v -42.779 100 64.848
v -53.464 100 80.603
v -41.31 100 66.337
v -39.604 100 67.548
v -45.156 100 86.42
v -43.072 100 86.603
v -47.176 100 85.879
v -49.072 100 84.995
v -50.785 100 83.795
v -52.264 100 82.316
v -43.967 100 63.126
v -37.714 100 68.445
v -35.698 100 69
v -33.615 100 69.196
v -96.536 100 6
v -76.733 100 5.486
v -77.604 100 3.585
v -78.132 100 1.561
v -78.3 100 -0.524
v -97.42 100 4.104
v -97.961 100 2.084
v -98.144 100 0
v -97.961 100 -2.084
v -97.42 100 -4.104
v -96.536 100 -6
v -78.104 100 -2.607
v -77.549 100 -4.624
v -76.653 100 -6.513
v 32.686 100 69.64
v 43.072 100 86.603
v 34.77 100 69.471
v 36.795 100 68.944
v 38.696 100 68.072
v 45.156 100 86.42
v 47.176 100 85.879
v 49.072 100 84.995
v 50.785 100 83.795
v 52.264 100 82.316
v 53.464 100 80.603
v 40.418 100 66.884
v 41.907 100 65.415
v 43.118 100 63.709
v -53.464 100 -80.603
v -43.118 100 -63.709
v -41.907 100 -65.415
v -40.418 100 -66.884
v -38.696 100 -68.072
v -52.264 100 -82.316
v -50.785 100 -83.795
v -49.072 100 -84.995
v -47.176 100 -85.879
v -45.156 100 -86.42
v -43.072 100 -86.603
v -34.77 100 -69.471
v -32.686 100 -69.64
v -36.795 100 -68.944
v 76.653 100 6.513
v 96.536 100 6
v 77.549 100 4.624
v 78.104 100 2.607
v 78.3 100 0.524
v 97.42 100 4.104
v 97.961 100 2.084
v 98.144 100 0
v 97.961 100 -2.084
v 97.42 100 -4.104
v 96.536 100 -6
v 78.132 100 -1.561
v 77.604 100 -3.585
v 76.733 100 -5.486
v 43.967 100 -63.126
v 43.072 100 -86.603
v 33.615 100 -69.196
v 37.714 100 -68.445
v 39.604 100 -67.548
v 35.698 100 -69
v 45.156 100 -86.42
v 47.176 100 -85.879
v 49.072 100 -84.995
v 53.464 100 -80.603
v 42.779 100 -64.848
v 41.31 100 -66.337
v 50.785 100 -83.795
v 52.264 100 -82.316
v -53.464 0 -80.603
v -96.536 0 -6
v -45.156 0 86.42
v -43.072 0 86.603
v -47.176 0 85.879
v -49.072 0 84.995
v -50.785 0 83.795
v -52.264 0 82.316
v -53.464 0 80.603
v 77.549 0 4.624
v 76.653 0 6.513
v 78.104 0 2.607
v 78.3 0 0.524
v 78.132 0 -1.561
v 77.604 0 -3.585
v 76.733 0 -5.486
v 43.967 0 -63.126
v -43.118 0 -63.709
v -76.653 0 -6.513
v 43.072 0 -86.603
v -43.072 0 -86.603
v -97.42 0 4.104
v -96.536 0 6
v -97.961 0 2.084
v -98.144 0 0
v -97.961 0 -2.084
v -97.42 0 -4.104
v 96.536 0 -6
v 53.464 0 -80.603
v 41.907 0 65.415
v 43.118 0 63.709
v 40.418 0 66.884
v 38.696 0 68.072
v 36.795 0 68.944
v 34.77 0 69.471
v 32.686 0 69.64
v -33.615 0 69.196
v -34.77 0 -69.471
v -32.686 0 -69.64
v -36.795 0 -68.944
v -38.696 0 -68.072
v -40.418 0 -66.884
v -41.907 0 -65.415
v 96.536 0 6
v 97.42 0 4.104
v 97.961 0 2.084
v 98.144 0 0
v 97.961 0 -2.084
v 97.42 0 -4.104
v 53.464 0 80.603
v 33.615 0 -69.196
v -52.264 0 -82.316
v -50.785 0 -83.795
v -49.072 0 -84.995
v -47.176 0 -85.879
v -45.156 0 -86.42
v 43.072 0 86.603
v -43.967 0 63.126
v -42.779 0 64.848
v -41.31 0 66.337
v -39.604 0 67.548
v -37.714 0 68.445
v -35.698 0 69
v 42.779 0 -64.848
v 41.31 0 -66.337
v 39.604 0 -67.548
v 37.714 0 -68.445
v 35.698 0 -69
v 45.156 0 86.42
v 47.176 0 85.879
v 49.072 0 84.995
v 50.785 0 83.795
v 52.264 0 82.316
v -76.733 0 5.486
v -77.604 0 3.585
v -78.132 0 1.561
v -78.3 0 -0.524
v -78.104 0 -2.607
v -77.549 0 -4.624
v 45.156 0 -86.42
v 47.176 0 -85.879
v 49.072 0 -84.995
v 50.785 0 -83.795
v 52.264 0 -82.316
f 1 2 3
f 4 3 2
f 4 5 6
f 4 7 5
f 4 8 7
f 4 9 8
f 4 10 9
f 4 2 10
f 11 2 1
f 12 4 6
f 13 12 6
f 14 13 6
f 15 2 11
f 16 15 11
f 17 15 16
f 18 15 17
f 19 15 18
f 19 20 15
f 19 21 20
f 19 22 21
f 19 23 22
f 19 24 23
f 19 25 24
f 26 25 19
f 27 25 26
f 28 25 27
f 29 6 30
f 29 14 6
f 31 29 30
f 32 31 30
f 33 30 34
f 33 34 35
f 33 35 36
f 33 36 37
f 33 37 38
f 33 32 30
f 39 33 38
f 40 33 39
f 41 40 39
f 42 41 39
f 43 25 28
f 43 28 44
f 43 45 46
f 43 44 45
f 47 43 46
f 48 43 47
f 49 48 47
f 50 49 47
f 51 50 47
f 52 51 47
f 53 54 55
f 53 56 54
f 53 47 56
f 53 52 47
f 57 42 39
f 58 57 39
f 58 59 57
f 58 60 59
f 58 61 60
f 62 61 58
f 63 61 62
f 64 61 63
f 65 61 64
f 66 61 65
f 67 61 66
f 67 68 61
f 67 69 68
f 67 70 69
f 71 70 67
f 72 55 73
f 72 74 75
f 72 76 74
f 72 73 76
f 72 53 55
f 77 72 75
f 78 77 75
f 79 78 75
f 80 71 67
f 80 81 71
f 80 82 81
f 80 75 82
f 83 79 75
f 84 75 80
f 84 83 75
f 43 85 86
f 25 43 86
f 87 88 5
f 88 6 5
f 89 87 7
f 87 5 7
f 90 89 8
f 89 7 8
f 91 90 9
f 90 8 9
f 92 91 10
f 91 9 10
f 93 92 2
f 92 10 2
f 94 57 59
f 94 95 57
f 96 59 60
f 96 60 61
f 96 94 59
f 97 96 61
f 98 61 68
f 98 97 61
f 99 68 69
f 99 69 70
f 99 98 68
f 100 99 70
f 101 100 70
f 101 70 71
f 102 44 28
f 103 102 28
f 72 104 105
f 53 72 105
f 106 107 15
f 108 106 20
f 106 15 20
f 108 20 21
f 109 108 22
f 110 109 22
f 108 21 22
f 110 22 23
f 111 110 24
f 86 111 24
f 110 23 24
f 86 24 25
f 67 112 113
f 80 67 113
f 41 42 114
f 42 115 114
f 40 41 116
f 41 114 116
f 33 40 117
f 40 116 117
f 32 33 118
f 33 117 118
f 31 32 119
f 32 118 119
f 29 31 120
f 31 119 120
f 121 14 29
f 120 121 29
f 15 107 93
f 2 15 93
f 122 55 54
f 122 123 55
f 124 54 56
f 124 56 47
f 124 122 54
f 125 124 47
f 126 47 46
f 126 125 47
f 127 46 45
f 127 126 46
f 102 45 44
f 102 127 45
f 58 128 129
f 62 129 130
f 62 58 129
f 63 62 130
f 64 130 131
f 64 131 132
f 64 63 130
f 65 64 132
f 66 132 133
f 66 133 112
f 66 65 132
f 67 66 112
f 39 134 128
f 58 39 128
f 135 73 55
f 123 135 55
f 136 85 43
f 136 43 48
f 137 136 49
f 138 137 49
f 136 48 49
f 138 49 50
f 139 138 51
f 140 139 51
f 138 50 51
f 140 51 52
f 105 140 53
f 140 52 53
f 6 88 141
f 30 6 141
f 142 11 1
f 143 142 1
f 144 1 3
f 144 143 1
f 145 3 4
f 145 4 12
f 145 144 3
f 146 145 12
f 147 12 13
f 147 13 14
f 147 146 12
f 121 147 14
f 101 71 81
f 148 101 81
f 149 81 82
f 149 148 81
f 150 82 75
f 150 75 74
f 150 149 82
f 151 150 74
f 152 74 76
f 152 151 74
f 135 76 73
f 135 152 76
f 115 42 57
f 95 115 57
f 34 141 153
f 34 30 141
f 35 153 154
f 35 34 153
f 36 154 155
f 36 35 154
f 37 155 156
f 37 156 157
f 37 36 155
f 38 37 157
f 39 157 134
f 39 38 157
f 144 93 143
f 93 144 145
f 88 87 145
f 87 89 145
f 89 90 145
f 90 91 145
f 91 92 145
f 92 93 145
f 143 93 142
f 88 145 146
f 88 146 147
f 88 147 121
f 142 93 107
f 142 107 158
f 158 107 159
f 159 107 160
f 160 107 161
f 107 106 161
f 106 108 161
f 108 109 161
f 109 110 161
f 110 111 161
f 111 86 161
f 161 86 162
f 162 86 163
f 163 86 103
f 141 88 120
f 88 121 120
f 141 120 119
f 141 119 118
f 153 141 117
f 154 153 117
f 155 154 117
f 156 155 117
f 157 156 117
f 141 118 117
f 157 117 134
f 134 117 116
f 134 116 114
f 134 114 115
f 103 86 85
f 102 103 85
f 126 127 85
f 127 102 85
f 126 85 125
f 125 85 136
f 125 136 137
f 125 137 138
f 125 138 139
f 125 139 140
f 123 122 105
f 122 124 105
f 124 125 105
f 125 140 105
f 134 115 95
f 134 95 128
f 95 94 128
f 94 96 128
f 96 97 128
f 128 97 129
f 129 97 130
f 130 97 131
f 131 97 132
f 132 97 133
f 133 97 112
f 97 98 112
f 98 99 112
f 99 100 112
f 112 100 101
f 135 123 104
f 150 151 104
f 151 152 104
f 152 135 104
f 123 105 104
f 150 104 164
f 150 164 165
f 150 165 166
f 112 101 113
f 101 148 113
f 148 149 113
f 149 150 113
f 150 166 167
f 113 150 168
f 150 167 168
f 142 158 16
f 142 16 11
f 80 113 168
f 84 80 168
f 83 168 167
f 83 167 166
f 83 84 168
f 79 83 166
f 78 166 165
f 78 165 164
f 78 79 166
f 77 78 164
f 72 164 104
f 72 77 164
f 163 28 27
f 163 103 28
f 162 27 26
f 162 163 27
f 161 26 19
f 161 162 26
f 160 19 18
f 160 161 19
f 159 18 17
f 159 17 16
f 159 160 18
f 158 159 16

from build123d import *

# Parameters (mm, degrees)
SALIENTE_EXTRUIR2_DEPTH = 100
CORTAR_EXTRUIR1_DEPTH   = 100
REDONDEO1_R             = 12
REDONDEO2_R             = 12


with BuildPart() as part:
    # Croquis1 → Saliente-Extruir2 (new body)
    with BuildSketch(Plane(origin=(0, 0, 0), x_dir=(1, 0, 0), z_dir=(0, 1, 0))):
        Polygon((-50, -86.602540378), (50, -86.602540378), (100, 0), (50, 86.602540378), (-50, 86.602540378), (-100, 0), align=None)
    extrude(amount=SALIENTE_EXTRUIR2_DEPTH)

    # Croquis3 → Cortar-Extruir1 (cut)
    with BuildSketch(Plane(origin=(0, 100, 0), x_dir=(1, 0, 0), z_dir=(0, 1, 0))):
        Polygon((39.613585437, -69.686093894), (80.156720321, -0.536675623), (40.543134884, 69.14941827), (-39.613585437, 69.686093894), (-80.156720321, 0.536675623), (-40.543134884, -69.14941827), align=None)
    extrude(amount=-CORTAR_EXTRUIR1_DEPTH, mode=Mode.SUBTRACT)

    # Redondeo1
    redondeo1_edges = [part.edges().sort_by_distance(p)[0] for p in [
        (-100, 50, 0),
        (-50, 50, -86.602540378),
        (50, 50, -86.602540378),
        (100, 50, 0),
        (50, 50, 86.602540378),
        (-50, 50, 86.602540378),
    ]]
    fillet(redondeo1_edges, radius=REDONDEO1_R)

    # Redondeo2
    redondeo2_edges = [part.edges().sort_by_distance(p)[0] for p in [
        (39.613585437, 50, 69.686093894),
        (-40.543134884, 50, 69.14941827),
        (-80.156720321, 50, -0.536675623),
        (-39.613585437, 50, -69.686093894),
        (40.543134884, 50, -69.14941827),
        (80.156720321, 50, 0.536675623),
    ]]
    fillet(redondeo2_edges, radius=REDONDEO2_R)


solid = part.part
